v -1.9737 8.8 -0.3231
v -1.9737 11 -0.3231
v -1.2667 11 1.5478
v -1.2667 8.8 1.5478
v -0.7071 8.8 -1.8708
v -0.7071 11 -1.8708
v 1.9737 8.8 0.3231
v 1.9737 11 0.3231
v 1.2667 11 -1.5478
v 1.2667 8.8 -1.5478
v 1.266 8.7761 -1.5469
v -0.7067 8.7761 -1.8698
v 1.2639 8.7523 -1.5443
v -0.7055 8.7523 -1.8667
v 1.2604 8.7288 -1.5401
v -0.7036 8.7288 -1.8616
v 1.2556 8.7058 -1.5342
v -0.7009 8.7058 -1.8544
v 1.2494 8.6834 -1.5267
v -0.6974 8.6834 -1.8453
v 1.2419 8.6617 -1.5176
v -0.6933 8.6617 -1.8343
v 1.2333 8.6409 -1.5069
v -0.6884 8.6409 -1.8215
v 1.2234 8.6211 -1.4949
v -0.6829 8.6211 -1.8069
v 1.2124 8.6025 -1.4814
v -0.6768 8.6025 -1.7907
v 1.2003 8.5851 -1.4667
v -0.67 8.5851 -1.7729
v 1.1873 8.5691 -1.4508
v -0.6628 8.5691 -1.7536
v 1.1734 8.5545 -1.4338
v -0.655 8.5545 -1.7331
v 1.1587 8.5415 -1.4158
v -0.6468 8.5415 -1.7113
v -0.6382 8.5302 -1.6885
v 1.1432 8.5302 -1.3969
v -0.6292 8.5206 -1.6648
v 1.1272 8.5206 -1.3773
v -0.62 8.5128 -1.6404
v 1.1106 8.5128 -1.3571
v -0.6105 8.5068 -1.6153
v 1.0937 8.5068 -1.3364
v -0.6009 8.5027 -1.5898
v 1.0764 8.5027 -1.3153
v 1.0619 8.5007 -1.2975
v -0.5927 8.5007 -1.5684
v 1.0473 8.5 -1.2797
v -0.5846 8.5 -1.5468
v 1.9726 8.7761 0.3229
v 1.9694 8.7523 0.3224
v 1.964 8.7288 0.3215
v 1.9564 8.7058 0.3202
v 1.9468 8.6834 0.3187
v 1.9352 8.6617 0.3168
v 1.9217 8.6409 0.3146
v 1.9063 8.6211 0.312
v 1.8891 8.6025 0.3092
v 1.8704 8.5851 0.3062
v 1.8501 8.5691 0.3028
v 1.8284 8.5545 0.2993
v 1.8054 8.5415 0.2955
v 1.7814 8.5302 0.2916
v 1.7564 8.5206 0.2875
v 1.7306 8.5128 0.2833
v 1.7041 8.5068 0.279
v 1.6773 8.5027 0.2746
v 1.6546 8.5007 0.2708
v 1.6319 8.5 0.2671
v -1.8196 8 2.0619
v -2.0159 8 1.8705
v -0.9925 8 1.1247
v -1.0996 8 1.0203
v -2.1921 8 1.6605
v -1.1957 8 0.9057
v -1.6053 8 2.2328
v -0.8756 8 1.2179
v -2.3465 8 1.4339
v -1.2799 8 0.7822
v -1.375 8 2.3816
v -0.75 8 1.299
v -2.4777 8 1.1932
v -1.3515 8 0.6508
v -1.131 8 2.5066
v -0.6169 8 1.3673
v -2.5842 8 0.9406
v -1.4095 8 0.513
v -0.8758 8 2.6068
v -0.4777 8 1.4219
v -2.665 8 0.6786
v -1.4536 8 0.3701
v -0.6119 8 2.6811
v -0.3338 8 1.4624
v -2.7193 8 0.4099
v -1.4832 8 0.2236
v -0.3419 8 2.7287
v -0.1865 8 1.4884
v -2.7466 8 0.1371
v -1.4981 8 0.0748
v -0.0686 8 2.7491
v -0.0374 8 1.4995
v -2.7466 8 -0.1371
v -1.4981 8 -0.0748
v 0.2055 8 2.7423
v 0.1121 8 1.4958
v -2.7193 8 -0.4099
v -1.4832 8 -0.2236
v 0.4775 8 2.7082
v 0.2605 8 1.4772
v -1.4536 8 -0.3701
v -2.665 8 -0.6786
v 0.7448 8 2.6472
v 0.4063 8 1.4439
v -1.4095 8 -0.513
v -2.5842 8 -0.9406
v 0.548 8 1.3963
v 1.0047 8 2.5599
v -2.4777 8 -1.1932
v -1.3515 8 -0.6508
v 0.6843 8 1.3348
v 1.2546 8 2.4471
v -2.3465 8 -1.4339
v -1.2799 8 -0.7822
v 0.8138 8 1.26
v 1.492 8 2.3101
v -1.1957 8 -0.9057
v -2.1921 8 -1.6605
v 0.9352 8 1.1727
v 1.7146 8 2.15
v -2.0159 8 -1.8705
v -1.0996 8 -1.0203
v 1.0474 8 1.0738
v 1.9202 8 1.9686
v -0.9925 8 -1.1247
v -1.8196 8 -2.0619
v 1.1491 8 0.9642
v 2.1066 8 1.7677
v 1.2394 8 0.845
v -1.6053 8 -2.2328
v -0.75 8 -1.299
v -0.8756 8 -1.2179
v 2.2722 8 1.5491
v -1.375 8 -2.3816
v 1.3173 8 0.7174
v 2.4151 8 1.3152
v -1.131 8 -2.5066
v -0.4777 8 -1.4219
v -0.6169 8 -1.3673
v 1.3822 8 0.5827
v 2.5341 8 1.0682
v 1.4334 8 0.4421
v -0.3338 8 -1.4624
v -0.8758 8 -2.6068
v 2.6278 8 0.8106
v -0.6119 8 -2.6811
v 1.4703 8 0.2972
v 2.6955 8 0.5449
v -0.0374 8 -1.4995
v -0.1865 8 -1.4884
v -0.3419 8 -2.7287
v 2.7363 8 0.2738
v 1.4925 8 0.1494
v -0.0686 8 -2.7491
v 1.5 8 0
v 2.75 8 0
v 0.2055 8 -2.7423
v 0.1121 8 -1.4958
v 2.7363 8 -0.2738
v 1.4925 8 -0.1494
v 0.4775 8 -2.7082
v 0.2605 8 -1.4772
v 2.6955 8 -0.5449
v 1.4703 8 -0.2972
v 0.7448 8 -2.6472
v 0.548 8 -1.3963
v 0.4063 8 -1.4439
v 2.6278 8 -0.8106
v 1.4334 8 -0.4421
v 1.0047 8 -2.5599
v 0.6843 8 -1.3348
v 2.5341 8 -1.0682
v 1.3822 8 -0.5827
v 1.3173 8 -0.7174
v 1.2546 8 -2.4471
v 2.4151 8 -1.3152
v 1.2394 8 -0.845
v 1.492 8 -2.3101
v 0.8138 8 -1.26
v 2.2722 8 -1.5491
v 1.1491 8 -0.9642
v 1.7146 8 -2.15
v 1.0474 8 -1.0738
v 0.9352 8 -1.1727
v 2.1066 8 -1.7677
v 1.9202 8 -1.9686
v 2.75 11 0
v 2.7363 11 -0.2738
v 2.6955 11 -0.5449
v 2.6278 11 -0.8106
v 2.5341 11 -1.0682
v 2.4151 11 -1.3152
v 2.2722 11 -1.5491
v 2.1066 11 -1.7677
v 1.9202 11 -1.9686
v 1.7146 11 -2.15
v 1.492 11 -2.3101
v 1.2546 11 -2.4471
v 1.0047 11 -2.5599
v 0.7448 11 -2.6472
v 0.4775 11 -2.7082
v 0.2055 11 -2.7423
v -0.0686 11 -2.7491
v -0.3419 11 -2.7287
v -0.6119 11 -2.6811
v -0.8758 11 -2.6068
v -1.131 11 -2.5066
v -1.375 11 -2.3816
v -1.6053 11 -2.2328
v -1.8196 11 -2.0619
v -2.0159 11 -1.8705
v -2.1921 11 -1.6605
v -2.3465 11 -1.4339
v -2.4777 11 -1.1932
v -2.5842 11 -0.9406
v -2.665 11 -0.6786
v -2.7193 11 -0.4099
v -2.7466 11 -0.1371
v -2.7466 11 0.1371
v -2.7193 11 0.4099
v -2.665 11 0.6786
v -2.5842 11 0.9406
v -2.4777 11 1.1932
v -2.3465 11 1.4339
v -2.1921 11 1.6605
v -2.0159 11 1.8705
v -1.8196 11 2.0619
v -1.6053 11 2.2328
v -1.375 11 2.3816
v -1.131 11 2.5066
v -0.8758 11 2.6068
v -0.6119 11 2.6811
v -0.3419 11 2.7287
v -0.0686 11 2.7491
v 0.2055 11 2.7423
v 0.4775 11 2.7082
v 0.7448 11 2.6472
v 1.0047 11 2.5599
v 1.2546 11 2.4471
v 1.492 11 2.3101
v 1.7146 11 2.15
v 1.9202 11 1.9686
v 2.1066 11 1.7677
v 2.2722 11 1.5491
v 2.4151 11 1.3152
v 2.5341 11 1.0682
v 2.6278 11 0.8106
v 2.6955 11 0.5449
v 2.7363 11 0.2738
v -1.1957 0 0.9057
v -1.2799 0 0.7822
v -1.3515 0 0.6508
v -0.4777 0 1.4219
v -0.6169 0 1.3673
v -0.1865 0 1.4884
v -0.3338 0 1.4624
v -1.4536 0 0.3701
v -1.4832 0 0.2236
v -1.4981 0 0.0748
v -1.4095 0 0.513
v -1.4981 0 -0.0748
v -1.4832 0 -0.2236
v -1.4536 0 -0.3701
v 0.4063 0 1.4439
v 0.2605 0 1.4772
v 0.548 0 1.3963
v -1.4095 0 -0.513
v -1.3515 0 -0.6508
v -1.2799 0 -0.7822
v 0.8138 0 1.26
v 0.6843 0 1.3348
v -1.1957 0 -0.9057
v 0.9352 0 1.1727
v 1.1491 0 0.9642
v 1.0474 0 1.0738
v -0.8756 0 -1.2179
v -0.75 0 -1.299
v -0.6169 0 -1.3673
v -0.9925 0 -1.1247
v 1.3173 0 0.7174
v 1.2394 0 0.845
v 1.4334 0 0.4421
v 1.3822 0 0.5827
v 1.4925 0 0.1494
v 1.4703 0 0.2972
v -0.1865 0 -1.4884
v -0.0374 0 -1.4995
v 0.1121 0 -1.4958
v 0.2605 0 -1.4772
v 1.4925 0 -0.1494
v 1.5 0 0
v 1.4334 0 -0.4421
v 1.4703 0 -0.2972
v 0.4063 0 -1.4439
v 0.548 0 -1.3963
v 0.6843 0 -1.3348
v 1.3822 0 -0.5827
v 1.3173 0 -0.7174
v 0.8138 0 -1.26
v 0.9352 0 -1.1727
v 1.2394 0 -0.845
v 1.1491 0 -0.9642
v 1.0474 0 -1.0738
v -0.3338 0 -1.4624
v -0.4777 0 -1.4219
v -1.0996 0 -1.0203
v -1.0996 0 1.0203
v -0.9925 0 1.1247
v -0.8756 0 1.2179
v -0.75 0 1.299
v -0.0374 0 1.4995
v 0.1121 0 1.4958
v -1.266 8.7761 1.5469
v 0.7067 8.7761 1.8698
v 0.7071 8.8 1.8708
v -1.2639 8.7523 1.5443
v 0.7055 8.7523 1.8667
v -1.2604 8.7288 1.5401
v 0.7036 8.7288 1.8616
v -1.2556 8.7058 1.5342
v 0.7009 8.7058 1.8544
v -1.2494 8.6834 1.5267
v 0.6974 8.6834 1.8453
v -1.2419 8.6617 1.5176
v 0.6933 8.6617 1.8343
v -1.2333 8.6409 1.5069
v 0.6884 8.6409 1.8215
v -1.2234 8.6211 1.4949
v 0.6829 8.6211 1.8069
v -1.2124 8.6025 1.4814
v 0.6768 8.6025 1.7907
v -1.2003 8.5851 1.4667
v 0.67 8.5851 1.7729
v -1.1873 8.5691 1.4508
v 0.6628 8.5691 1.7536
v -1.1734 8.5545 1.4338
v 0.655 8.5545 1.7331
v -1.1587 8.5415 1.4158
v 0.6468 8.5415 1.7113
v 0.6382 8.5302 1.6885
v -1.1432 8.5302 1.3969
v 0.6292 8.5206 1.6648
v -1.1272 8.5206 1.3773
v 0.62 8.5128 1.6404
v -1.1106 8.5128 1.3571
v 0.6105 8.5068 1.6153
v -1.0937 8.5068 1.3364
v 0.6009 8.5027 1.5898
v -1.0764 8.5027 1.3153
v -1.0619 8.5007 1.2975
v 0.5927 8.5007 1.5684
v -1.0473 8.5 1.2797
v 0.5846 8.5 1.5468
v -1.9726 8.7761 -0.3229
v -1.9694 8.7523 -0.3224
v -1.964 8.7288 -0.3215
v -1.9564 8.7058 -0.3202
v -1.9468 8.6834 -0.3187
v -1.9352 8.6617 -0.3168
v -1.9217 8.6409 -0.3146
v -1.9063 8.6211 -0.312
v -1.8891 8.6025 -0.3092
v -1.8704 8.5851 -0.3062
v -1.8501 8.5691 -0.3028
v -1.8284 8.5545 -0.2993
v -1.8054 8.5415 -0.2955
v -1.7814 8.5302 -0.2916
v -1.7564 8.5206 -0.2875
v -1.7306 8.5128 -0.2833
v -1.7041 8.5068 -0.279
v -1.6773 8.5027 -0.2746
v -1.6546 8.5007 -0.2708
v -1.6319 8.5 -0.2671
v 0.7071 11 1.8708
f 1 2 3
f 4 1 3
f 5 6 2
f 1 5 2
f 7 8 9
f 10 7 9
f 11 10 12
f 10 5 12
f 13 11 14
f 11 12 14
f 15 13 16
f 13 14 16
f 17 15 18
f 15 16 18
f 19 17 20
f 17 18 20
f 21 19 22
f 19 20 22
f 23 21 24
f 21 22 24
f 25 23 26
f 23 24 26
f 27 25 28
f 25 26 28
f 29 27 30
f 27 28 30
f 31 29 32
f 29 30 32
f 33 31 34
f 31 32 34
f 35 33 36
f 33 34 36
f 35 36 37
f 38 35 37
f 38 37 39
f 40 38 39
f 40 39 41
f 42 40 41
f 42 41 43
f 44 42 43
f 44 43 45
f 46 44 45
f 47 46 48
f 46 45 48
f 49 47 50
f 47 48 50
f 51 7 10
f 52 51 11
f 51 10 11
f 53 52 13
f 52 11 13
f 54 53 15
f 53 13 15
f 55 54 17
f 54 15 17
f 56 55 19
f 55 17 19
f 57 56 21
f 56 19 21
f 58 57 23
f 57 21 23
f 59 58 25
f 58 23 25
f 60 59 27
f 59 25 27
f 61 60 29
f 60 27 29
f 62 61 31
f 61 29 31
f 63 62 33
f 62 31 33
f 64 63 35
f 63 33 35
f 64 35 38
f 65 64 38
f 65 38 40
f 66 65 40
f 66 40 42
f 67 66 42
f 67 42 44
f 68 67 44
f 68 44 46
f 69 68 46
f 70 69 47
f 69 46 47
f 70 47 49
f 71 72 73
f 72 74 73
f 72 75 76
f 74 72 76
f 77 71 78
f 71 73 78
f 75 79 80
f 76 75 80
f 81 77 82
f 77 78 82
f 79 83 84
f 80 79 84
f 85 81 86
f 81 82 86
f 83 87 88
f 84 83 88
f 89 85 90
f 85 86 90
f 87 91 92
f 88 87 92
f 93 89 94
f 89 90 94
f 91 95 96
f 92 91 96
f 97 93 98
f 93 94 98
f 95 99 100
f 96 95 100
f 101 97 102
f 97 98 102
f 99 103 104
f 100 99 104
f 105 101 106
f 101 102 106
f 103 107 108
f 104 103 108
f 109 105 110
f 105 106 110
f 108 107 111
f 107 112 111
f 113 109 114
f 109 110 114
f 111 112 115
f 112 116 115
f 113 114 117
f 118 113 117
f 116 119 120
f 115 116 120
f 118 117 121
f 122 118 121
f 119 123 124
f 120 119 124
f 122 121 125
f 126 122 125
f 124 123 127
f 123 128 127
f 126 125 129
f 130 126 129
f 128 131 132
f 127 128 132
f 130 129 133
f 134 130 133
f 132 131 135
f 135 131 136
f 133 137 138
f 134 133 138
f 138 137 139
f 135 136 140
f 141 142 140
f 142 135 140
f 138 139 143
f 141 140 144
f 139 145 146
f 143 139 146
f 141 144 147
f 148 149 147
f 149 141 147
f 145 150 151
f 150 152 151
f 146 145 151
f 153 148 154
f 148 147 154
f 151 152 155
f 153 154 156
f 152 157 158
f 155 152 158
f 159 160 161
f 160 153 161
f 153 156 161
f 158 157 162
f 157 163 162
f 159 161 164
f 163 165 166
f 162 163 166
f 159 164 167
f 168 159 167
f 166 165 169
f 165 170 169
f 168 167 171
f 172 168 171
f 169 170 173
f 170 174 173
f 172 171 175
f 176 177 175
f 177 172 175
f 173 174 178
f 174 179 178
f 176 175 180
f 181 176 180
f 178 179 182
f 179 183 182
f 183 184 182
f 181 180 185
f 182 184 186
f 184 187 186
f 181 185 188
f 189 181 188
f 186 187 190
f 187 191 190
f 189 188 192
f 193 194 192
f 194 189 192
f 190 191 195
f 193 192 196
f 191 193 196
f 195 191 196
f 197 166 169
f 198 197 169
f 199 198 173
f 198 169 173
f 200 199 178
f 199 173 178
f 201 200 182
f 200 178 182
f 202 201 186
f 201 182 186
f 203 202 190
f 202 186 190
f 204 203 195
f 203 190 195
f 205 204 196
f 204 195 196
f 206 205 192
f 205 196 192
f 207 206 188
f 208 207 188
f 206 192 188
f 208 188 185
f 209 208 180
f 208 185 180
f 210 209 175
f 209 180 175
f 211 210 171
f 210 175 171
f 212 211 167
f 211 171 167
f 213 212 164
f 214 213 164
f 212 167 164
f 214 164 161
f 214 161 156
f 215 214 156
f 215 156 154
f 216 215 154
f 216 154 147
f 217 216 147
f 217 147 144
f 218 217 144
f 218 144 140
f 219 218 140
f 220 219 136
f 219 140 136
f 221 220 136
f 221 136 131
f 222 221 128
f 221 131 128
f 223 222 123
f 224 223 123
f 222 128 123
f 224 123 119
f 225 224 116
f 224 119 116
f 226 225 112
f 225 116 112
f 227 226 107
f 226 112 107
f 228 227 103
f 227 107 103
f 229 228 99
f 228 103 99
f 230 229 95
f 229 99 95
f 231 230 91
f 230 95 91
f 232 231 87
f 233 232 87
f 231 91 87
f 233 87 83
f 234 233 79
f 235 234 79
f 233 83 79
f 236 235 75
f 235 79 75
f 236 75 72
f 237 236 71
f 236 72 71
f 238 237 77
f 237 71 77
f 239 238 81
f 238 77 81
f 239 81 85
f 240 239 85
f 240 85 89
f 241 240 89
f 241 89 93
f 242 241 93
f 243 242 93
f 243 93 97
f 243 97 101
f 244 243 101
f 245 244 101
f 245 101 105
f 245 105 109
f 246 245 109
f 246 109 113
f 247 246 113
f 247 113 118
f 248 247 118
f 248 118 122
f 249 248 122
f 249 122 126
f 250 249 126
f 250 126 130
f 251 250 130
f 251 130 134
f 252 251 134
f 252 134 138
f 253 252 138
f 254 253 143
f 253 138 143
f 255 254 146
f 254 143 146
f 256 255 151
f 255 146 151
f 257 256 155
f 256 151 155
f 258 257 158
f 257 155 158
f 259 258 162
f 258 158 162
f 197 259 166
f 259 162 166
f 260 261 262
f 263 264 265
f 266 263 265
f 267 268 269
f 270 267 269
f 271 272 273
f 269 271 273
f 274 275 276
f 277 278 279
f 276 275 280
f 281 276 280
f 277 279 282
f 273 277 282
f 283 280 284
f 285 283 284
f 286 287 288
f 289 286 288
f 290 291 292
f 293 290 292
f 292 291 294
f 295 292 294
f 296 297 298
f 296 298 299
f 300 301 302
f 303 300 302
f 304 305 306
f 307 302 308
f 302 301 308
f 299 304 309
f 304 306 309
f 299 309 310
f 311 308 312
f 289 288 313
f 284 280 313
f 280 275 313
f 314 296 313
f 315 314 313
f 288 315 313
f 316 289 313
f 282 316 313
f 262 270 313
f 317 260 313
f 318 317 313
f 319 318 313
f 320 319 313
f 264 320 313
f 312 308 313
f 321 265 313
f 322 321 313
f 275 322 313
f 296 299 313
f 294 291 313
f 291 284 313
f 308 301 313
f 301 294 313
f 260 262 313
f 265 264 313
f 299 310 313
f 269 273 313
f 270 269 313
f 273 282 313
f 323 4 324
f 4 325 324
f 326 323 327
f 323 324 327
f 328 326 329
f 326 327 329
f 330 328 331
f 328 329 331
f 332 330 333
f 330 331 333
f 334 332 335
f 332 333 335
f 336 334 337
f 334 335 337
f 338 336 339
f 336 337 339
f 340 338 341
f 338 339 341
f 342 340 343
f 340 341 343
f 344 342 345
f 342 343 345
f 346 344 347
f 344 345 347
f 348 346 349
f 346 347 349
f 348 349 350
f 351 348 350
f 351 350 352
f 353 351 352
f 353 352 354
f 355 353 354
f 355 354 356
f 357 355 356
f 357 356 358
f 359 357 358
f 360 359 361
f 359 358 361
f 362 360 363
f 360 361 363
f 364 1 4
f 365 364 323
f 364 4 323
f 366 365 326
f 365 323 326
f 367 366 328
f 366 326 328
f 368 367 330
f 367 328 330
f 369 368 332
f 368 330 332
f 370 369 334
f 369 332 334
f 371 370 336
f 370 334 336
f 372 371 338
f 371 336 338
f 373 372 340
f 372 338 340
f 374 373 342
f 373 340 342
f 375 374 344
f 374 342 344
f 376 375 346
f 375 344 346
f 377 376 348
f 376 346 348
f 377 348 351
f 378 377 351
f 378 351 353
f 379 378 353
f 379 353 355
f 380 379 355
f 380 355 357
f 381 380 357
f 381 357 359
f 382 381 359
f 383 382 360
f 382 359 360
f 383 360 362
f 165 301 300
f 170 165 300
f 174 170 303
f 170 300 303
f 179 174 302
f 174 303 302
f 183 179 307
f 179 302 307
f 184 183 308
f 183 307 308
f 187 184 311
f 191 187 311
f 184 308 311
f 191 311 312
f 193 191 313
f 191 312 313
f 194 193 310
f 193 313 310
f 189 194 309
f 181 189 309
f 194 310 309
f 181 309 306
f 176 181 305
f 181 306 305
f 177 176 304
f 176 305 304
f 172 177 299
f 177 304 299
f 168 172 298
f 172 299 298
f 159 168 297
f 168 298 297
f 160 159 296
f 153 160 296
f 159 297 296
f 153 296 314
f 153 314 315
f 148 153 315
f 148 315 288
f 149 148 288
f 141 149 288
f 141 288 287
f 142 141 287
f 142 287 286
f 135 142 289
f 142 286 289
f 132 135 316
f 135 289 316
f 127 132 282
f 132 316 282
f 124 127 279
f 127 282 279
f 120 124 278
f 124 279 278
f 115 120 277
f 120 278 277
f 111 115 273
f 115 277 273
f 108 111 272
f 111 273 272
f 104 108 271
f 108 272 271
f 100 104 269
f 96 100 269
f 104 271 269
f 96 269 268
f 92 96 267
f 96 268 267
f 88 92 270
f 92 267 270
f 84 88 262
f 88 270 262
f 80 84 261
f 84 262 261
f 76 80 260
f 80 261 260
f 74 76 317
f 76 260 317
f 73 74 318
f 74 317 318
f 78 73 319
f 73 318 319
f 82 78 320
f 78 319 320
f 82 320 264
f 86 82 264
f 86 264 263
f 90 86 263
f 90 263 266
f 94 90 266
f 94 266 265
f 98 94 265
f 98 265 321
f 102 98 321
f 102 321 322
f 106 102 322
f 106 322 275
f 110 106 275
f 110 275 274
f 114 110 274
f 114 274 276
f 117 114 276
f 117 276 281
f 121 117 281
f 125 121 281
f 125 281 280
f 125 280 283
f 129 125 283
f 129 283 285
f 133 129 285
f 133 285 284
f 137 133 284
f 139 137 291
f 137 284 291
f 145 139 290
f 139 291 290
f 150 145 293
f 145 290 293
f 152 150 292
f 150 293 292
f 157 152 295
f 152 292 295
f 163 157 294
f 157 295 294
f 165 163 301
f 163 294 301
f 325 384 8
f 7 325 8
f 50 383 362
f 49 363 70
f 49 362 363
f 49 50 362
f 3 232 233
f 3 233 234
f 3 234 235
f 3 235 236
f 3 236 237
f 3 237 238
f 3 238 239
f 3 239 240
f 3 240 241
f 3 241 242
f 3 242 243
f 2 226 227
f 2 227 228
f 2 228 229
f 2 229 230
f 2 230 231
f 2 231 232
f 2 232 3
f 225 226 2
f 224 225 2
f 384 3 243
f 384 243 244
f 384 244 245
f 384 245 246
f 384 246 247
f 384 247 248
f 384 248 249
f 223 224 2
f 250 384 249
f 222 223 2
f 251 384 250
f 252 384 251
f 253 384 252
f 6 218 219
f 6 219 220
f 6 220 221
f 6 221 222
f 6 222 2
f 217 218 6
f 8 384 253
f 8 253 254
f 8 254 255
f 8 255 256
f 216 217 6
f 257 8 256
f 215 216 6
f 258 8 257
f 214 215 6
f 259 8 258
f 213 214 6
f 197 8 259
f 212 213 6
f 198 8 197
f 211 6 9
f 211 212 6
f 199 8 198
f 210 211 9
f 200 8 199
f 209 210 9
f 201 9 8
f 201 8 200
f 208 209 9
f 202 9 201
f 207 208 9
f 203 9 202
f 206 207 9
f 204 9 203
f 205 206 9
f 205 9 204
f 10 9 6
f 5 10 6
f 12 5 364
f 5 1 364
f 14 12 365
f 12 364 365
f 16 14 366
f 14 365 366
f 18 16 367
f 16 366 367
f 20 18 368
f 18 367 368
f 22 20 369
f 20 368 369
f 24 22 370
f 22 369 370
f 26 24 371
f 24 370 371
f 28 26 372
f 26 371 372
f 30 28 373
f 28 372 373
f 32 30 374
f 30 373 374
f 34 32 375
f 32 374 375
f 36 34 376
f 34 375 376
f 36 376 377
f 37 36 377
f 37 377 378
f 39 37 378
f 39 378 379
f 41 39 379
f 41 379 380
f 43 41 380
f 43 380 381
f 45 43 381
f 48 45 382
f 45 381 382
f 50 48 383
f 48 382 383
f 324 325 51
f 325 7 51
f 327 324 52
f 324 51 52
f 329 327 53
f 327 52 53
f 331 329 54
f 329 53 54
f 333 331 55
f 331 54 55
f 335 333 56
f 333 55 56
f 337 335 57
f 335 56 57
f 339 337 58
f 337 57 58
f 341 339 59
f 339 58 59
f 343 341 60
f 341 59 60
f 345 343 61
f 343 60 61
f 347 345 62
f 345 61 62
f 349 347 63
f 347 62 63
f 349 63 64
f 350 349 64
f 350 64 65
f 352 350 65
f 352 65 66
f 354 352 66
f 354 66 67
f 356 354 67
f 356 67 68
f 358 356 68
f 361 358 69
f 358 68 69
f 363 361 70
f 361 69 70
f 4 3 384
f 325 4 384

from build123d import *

# Parameters (mm, degrees)
SKETCH_1_R          = 1.5
EXTRUDE_1_DEPTH     = 8
SKETCH_2_R          = 2.75
EXTRUDE_2_DEPTH     = 3
CUT_EXTRUDE_1_DEPTH = 2.5
FILLET_1_R          = 0.3


with BuildPart() as part:
    # 草图1 → 凸台-拉伸1 (new body)
    with BuildSketch(Plane(origin=(0, 0, 0), x_dir=(1, 0, 0), z_dir=(0, 1, 0))):
        Circle(SKETCH_1_R)
    extrude(amount=EXTRUDE_1_DEPTH)

    # 草图2 → 凸台-拉伸2 (add)
    with BuildSketch(Plane(origin=(0, 8, 0), x_dir=(1, 0, 0), z_dir=(0, 1, 0))):
        Circle(SKETCH_2_R)
    extrude(amount=EXTRUDE_2_DEPTH)

    # 草图3 → 切除-拉伸1 (cut)
    with BuildSketch(Plane(origin=(0, 11, 0), x_dir=(1, 0, 0), z_dir=(0, 1, 0))):
        Polygon((1.973732301, -0.323080184), (1.266661797, 1.54776222), (-0.707070503, 1.870842405), (-1.973732301, 0.323080184), (-1.266661797, -1.54776222), (0.707070503, -1.870842405), align=None)
    extrude(amount=-CUT_EXTRUDE_1_DEPTH, mode=Mode.SUBTRACT)

    # 圆角1
    fillet_1_edges = [part.edges().sort_by_distance(p)[0] for p in [
        (1.340401402, 8.5, 1.096961295),
        (-0.279795647, 8.5, 1.709302313),
        (-1.620197049, 8.5, 0.612341018),
        (-1.340401402, 8.5, -1.096961295),
        (0.279795647, 8.5, -1.709302313),
        (1.620197049, 8.5, -0.612341018),
    ]]
    fillet(fillet_1_edges, radius=FILLET_1_R)


solid = part.part
